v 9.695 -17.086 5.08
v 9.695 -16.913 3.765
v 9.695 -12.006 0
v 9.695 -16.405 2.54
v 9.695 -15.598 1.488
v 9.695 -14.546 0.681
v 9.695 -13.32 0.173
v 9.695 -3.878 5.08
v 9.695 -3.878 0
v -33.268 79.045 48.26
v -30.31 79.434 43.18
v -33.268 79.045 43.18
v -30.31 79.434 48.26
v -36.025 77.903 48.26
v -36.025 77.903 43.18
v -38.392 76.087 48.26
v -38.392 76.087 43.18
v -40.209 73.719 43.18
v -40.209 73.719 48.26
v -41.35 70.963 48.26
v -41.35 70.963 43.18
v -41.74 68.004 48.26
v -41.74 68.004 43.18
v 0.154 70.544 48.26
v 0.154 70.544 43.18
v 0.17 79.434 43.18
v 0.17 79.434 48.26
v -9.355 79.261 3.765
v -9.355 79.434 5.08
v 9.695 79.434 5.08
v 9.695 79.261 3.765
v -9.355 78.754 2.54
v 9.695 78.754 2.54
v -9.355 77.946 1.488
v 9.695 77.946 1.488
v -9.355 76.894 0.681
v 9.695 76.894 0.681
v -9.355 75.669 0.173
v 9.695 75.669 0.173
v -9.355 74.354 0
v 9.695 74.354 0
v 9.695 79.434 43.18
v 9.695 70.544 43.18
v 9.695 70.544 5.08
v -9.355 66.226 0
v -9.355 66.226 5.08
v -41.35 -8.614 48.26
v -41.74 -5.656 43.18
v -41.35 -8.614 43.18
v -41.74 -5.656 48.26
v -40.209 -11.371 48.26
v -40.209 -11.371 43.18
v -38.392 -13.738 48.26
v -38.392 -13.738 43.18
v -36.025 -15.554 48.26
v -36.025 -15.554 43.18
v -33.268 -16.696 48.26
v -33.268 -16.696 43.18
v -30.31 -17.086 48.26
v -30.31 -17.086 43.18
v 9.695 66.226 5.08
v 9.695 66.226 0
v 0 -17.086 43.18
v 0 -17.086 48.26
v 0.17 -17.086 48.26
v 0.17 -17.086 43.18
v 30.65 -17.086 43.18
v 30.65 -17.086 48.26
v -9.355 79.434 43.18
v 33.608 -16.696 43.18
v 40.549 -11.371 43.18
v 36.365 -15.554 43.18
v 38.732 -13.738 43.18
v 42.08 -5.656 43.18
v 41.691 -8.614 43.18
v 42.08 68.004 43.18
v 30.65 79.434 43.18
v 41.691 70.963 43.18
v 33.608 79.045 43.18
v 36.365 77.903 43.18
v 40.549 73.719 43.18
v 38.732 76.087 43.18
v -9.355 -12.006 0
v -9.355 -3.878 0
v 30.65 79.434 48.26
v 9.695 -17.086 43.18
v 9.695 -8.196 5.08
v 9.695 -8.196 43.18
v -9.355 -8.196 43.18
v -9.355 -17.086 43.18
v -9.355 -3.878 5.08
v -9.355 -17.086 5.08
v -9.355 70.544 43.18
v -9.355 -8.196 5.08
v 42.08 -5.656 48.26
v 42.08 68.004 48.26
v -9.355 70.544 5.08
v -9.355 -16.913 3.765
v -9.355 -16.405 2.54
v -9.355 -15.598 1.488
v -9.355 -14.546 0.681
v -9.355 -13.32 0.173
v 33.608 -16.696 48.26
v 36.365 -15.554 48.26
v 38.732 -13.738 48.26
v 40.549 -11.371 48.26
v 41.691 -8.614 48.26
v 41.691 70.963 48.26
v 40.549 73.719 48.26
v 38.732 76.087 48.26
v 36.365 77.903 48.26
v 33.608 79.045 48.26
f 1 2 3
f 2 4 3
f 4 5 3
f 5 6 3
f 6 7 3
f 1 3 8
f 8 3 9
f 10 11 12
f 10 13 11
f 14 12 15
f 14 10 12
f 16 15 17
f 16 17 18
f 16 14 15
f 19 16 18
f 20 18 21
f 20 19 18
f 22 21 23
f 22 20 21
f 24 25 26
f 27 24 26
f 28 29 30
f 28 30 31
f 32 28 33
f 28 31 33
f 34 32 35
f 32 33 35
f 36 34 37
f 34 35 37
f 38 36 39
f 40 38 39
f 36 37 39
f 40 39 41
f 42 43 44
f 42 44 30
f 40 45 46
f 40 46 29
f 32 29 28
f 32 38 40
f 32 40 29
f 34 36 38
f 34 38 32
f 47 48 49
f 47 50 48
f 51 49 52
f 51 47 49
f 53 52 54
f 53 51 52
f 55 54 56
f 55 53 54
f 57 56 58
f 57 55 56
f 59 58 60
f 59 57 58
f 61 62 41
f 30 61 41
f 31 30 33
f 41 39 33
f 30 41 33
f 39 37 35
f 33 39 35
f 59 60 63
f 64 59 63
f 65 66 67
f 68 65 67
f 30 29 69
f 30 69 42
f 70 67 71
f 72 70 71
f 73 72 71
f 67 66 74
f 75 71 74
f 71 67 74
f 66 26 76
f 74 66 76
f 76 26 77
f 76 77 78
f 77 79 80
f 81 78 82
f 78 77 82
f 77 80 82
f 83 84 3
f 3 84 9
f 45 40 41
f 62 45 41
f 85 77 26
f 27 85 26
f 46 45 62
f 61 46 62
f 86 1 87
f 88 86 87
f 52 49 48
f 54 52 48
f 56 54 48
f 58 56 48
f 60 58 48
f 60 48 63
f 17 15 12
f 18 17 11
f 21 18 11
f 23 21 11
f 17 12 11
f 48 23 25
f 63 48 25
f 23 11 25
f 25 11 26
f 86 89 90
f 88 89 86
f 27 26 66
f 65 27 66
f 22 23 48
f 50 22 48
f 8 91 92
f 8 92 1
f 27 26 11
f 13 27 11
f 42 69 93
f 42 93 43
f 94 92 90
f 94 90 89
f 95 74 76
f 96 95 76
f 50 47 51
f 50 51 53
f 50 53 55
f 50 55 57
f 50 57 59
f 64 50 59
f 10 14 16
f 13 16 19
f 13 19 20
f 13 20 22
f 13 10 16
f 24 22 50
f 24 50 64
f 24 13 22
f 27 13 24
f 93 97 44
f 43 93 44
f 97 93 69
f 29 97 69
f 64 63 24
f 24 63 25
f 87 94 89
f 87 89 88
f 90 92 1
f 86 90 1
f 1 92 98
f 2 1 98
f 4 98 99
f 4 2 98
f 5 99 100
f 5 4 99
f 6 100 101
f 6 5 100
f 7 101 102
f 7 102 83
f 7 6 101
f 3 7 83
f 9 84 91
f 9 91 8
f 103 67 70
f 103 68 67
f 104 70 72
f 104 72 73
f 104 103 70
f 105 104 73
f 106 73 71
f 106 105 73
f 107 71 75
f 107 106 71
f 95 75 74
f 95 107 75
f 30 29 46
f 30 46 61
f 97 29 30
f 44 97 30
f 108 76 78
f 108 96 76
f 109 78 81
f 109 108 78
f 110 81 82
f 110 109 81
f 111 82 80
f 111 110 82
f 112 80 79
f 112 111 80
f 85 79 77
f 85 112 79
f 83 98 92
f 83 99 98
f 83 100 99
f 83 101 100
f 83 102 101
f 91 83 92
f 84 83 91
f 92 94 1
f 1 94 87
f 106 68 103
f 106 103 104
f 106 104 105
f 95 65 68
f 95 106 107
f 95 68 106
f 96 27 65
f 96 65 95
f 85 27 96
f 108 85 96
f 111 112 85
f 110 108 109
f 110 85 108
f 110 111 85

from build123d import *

# Parameters (mm, degrees)
F0_W     = 19.05
F0_H     = 13.208
F1_DEPTH = 5.08
F2_W     = 19.05
F2_H     = 8.89
F3_DEPTH = 38.1
F4_W     = 9.525
F4_H     = 8.89
F5_DEPTH = 5.08
F6_R     = 5.07999
F6_2_R   = 5.07999
F7_R     = 11.43
F7_2_R   = 11.43


# Not quite as in the source:
# - a fillet or chamfer is up to 0.001 mm smaller than in the source, because OpenCascade refuses the exact size


with BuildPart() as f1:
    # F0 (on Top) → F1 (new body)
    with BuildSketch(Plane.XY):
        with Locations((0.1700367264, -10.481657926)):
            Rectangle(F0_W, F0_H)
    extrude(amount=F1_DEPTH)

    # F6#2 (radius 5.08 in the source; OpenCascade refuses exactly that, so slightly less here)
    f6_2_edges = [f1.edges().sort_by_distance(p)[0] for p in [
        (0.170037, -17.085658, 0),
    ]]
    fillet(f6_2_edges, radius=F6_2_R)


with BuildPart() as f1b:
    # F0 (on Top) → F1, piece 2 (new body)
    with BuildSketch(Plane.XY):
        with Locations((0.1700367264, 72.830342074)):
            Rectangle(F0_W, F0_H)
    extrude(amount=F1_DEPTH)

    # F6 (radius 5.08 in the source; OpenCascade refuses exactly that, so slightly less here)
    f6_edges = [f1b.edges().sort_by_distance(p)[0] for p in [
        (0.170037, 79.434342, 0),
    ]]
    fillet(f6_edges, radius=F6_R)


with BuildPart() as f3:
    # F2 (on face) → F3 (new body)
    with BuildSketch(Plane.XY.offset(5.08)):
        with Locations((0.1700367264, -12.640657926)):
            Rectangle(F2_W, F2_H)
    extrude(amount=F3_DEPTH)


with BuildPart() as f3b:
    # F2 (on face) → F3, piece 2 (new body)
    with BuildSketch(Plane.XY.offset(5.08)):
        with Locations((0.1700367264, 74.989342074)):
            Rectangle(F2_W, F2_H)
    extrude(amount=F3_DEPTH)


with BuildPart() as f5:
    # F4 (on face) → F5 (new body)
    with BuildSketch(Plane.XY.offset(43.18)):
        Polygon((9.6950367264, 70.544342074), (0.1700367264, 70.544342074), (0.1700367264, -17.085657926), (42.0800367264, -17.085657926), (42.0800367264, 79.434342074), (9.6950367264, 79.434342074), align=None)
        with Locations((4.9325367264, 74.989342074)):
            Rectangle(F4_W, F4_H)
    extrude(amount=F5_DEPTH)

    # F7
    f7_edges = [f5.edges().sort_by_distance(p)[0] for p in [
        (42.080037, 79.434342, 45.72),
        (42.080037, -17.085658, 45.72),
    ]]
    fillet(f7_edges, radius=F7_R)


with BuildPart() as f5b:
    # F4 (on face) → F5, piece 2 (new body)
    with BuildSketch(Plane.XY.offset(43.18)):
        Polygon((3.6226e-05, -17.085657926), (0.1543787856, 70.544342074), (-9.3549632736, 70.544342074), (-9.3549632736, 79.434342074), (-41.7399632736, 79.434342074), (-41.7399632736, -17.085657926), align=None)
        Polygon((0.1543787856, 70.544342074), (0.1700367264, 79.434342074), (-9.3549632736, 79.434342074), (-9.3549632736, 70.544342074), align=None)
    extrude(amount=F5_DEPTH)

    # F7#2
    f7_2_edges = [f5b.edges().sort_by_distance(p)[0] for p in [
        (-41.739963, 79.434342, 45.72),
        (-41.739963, -17.085658, 45.72),
    ]]
    fillet(f7_2_edges, radius=F7_2_R)


solid = Compound([f1.part, f1b.part, f3.part, f3b.part, f5.part, f5b.part])
